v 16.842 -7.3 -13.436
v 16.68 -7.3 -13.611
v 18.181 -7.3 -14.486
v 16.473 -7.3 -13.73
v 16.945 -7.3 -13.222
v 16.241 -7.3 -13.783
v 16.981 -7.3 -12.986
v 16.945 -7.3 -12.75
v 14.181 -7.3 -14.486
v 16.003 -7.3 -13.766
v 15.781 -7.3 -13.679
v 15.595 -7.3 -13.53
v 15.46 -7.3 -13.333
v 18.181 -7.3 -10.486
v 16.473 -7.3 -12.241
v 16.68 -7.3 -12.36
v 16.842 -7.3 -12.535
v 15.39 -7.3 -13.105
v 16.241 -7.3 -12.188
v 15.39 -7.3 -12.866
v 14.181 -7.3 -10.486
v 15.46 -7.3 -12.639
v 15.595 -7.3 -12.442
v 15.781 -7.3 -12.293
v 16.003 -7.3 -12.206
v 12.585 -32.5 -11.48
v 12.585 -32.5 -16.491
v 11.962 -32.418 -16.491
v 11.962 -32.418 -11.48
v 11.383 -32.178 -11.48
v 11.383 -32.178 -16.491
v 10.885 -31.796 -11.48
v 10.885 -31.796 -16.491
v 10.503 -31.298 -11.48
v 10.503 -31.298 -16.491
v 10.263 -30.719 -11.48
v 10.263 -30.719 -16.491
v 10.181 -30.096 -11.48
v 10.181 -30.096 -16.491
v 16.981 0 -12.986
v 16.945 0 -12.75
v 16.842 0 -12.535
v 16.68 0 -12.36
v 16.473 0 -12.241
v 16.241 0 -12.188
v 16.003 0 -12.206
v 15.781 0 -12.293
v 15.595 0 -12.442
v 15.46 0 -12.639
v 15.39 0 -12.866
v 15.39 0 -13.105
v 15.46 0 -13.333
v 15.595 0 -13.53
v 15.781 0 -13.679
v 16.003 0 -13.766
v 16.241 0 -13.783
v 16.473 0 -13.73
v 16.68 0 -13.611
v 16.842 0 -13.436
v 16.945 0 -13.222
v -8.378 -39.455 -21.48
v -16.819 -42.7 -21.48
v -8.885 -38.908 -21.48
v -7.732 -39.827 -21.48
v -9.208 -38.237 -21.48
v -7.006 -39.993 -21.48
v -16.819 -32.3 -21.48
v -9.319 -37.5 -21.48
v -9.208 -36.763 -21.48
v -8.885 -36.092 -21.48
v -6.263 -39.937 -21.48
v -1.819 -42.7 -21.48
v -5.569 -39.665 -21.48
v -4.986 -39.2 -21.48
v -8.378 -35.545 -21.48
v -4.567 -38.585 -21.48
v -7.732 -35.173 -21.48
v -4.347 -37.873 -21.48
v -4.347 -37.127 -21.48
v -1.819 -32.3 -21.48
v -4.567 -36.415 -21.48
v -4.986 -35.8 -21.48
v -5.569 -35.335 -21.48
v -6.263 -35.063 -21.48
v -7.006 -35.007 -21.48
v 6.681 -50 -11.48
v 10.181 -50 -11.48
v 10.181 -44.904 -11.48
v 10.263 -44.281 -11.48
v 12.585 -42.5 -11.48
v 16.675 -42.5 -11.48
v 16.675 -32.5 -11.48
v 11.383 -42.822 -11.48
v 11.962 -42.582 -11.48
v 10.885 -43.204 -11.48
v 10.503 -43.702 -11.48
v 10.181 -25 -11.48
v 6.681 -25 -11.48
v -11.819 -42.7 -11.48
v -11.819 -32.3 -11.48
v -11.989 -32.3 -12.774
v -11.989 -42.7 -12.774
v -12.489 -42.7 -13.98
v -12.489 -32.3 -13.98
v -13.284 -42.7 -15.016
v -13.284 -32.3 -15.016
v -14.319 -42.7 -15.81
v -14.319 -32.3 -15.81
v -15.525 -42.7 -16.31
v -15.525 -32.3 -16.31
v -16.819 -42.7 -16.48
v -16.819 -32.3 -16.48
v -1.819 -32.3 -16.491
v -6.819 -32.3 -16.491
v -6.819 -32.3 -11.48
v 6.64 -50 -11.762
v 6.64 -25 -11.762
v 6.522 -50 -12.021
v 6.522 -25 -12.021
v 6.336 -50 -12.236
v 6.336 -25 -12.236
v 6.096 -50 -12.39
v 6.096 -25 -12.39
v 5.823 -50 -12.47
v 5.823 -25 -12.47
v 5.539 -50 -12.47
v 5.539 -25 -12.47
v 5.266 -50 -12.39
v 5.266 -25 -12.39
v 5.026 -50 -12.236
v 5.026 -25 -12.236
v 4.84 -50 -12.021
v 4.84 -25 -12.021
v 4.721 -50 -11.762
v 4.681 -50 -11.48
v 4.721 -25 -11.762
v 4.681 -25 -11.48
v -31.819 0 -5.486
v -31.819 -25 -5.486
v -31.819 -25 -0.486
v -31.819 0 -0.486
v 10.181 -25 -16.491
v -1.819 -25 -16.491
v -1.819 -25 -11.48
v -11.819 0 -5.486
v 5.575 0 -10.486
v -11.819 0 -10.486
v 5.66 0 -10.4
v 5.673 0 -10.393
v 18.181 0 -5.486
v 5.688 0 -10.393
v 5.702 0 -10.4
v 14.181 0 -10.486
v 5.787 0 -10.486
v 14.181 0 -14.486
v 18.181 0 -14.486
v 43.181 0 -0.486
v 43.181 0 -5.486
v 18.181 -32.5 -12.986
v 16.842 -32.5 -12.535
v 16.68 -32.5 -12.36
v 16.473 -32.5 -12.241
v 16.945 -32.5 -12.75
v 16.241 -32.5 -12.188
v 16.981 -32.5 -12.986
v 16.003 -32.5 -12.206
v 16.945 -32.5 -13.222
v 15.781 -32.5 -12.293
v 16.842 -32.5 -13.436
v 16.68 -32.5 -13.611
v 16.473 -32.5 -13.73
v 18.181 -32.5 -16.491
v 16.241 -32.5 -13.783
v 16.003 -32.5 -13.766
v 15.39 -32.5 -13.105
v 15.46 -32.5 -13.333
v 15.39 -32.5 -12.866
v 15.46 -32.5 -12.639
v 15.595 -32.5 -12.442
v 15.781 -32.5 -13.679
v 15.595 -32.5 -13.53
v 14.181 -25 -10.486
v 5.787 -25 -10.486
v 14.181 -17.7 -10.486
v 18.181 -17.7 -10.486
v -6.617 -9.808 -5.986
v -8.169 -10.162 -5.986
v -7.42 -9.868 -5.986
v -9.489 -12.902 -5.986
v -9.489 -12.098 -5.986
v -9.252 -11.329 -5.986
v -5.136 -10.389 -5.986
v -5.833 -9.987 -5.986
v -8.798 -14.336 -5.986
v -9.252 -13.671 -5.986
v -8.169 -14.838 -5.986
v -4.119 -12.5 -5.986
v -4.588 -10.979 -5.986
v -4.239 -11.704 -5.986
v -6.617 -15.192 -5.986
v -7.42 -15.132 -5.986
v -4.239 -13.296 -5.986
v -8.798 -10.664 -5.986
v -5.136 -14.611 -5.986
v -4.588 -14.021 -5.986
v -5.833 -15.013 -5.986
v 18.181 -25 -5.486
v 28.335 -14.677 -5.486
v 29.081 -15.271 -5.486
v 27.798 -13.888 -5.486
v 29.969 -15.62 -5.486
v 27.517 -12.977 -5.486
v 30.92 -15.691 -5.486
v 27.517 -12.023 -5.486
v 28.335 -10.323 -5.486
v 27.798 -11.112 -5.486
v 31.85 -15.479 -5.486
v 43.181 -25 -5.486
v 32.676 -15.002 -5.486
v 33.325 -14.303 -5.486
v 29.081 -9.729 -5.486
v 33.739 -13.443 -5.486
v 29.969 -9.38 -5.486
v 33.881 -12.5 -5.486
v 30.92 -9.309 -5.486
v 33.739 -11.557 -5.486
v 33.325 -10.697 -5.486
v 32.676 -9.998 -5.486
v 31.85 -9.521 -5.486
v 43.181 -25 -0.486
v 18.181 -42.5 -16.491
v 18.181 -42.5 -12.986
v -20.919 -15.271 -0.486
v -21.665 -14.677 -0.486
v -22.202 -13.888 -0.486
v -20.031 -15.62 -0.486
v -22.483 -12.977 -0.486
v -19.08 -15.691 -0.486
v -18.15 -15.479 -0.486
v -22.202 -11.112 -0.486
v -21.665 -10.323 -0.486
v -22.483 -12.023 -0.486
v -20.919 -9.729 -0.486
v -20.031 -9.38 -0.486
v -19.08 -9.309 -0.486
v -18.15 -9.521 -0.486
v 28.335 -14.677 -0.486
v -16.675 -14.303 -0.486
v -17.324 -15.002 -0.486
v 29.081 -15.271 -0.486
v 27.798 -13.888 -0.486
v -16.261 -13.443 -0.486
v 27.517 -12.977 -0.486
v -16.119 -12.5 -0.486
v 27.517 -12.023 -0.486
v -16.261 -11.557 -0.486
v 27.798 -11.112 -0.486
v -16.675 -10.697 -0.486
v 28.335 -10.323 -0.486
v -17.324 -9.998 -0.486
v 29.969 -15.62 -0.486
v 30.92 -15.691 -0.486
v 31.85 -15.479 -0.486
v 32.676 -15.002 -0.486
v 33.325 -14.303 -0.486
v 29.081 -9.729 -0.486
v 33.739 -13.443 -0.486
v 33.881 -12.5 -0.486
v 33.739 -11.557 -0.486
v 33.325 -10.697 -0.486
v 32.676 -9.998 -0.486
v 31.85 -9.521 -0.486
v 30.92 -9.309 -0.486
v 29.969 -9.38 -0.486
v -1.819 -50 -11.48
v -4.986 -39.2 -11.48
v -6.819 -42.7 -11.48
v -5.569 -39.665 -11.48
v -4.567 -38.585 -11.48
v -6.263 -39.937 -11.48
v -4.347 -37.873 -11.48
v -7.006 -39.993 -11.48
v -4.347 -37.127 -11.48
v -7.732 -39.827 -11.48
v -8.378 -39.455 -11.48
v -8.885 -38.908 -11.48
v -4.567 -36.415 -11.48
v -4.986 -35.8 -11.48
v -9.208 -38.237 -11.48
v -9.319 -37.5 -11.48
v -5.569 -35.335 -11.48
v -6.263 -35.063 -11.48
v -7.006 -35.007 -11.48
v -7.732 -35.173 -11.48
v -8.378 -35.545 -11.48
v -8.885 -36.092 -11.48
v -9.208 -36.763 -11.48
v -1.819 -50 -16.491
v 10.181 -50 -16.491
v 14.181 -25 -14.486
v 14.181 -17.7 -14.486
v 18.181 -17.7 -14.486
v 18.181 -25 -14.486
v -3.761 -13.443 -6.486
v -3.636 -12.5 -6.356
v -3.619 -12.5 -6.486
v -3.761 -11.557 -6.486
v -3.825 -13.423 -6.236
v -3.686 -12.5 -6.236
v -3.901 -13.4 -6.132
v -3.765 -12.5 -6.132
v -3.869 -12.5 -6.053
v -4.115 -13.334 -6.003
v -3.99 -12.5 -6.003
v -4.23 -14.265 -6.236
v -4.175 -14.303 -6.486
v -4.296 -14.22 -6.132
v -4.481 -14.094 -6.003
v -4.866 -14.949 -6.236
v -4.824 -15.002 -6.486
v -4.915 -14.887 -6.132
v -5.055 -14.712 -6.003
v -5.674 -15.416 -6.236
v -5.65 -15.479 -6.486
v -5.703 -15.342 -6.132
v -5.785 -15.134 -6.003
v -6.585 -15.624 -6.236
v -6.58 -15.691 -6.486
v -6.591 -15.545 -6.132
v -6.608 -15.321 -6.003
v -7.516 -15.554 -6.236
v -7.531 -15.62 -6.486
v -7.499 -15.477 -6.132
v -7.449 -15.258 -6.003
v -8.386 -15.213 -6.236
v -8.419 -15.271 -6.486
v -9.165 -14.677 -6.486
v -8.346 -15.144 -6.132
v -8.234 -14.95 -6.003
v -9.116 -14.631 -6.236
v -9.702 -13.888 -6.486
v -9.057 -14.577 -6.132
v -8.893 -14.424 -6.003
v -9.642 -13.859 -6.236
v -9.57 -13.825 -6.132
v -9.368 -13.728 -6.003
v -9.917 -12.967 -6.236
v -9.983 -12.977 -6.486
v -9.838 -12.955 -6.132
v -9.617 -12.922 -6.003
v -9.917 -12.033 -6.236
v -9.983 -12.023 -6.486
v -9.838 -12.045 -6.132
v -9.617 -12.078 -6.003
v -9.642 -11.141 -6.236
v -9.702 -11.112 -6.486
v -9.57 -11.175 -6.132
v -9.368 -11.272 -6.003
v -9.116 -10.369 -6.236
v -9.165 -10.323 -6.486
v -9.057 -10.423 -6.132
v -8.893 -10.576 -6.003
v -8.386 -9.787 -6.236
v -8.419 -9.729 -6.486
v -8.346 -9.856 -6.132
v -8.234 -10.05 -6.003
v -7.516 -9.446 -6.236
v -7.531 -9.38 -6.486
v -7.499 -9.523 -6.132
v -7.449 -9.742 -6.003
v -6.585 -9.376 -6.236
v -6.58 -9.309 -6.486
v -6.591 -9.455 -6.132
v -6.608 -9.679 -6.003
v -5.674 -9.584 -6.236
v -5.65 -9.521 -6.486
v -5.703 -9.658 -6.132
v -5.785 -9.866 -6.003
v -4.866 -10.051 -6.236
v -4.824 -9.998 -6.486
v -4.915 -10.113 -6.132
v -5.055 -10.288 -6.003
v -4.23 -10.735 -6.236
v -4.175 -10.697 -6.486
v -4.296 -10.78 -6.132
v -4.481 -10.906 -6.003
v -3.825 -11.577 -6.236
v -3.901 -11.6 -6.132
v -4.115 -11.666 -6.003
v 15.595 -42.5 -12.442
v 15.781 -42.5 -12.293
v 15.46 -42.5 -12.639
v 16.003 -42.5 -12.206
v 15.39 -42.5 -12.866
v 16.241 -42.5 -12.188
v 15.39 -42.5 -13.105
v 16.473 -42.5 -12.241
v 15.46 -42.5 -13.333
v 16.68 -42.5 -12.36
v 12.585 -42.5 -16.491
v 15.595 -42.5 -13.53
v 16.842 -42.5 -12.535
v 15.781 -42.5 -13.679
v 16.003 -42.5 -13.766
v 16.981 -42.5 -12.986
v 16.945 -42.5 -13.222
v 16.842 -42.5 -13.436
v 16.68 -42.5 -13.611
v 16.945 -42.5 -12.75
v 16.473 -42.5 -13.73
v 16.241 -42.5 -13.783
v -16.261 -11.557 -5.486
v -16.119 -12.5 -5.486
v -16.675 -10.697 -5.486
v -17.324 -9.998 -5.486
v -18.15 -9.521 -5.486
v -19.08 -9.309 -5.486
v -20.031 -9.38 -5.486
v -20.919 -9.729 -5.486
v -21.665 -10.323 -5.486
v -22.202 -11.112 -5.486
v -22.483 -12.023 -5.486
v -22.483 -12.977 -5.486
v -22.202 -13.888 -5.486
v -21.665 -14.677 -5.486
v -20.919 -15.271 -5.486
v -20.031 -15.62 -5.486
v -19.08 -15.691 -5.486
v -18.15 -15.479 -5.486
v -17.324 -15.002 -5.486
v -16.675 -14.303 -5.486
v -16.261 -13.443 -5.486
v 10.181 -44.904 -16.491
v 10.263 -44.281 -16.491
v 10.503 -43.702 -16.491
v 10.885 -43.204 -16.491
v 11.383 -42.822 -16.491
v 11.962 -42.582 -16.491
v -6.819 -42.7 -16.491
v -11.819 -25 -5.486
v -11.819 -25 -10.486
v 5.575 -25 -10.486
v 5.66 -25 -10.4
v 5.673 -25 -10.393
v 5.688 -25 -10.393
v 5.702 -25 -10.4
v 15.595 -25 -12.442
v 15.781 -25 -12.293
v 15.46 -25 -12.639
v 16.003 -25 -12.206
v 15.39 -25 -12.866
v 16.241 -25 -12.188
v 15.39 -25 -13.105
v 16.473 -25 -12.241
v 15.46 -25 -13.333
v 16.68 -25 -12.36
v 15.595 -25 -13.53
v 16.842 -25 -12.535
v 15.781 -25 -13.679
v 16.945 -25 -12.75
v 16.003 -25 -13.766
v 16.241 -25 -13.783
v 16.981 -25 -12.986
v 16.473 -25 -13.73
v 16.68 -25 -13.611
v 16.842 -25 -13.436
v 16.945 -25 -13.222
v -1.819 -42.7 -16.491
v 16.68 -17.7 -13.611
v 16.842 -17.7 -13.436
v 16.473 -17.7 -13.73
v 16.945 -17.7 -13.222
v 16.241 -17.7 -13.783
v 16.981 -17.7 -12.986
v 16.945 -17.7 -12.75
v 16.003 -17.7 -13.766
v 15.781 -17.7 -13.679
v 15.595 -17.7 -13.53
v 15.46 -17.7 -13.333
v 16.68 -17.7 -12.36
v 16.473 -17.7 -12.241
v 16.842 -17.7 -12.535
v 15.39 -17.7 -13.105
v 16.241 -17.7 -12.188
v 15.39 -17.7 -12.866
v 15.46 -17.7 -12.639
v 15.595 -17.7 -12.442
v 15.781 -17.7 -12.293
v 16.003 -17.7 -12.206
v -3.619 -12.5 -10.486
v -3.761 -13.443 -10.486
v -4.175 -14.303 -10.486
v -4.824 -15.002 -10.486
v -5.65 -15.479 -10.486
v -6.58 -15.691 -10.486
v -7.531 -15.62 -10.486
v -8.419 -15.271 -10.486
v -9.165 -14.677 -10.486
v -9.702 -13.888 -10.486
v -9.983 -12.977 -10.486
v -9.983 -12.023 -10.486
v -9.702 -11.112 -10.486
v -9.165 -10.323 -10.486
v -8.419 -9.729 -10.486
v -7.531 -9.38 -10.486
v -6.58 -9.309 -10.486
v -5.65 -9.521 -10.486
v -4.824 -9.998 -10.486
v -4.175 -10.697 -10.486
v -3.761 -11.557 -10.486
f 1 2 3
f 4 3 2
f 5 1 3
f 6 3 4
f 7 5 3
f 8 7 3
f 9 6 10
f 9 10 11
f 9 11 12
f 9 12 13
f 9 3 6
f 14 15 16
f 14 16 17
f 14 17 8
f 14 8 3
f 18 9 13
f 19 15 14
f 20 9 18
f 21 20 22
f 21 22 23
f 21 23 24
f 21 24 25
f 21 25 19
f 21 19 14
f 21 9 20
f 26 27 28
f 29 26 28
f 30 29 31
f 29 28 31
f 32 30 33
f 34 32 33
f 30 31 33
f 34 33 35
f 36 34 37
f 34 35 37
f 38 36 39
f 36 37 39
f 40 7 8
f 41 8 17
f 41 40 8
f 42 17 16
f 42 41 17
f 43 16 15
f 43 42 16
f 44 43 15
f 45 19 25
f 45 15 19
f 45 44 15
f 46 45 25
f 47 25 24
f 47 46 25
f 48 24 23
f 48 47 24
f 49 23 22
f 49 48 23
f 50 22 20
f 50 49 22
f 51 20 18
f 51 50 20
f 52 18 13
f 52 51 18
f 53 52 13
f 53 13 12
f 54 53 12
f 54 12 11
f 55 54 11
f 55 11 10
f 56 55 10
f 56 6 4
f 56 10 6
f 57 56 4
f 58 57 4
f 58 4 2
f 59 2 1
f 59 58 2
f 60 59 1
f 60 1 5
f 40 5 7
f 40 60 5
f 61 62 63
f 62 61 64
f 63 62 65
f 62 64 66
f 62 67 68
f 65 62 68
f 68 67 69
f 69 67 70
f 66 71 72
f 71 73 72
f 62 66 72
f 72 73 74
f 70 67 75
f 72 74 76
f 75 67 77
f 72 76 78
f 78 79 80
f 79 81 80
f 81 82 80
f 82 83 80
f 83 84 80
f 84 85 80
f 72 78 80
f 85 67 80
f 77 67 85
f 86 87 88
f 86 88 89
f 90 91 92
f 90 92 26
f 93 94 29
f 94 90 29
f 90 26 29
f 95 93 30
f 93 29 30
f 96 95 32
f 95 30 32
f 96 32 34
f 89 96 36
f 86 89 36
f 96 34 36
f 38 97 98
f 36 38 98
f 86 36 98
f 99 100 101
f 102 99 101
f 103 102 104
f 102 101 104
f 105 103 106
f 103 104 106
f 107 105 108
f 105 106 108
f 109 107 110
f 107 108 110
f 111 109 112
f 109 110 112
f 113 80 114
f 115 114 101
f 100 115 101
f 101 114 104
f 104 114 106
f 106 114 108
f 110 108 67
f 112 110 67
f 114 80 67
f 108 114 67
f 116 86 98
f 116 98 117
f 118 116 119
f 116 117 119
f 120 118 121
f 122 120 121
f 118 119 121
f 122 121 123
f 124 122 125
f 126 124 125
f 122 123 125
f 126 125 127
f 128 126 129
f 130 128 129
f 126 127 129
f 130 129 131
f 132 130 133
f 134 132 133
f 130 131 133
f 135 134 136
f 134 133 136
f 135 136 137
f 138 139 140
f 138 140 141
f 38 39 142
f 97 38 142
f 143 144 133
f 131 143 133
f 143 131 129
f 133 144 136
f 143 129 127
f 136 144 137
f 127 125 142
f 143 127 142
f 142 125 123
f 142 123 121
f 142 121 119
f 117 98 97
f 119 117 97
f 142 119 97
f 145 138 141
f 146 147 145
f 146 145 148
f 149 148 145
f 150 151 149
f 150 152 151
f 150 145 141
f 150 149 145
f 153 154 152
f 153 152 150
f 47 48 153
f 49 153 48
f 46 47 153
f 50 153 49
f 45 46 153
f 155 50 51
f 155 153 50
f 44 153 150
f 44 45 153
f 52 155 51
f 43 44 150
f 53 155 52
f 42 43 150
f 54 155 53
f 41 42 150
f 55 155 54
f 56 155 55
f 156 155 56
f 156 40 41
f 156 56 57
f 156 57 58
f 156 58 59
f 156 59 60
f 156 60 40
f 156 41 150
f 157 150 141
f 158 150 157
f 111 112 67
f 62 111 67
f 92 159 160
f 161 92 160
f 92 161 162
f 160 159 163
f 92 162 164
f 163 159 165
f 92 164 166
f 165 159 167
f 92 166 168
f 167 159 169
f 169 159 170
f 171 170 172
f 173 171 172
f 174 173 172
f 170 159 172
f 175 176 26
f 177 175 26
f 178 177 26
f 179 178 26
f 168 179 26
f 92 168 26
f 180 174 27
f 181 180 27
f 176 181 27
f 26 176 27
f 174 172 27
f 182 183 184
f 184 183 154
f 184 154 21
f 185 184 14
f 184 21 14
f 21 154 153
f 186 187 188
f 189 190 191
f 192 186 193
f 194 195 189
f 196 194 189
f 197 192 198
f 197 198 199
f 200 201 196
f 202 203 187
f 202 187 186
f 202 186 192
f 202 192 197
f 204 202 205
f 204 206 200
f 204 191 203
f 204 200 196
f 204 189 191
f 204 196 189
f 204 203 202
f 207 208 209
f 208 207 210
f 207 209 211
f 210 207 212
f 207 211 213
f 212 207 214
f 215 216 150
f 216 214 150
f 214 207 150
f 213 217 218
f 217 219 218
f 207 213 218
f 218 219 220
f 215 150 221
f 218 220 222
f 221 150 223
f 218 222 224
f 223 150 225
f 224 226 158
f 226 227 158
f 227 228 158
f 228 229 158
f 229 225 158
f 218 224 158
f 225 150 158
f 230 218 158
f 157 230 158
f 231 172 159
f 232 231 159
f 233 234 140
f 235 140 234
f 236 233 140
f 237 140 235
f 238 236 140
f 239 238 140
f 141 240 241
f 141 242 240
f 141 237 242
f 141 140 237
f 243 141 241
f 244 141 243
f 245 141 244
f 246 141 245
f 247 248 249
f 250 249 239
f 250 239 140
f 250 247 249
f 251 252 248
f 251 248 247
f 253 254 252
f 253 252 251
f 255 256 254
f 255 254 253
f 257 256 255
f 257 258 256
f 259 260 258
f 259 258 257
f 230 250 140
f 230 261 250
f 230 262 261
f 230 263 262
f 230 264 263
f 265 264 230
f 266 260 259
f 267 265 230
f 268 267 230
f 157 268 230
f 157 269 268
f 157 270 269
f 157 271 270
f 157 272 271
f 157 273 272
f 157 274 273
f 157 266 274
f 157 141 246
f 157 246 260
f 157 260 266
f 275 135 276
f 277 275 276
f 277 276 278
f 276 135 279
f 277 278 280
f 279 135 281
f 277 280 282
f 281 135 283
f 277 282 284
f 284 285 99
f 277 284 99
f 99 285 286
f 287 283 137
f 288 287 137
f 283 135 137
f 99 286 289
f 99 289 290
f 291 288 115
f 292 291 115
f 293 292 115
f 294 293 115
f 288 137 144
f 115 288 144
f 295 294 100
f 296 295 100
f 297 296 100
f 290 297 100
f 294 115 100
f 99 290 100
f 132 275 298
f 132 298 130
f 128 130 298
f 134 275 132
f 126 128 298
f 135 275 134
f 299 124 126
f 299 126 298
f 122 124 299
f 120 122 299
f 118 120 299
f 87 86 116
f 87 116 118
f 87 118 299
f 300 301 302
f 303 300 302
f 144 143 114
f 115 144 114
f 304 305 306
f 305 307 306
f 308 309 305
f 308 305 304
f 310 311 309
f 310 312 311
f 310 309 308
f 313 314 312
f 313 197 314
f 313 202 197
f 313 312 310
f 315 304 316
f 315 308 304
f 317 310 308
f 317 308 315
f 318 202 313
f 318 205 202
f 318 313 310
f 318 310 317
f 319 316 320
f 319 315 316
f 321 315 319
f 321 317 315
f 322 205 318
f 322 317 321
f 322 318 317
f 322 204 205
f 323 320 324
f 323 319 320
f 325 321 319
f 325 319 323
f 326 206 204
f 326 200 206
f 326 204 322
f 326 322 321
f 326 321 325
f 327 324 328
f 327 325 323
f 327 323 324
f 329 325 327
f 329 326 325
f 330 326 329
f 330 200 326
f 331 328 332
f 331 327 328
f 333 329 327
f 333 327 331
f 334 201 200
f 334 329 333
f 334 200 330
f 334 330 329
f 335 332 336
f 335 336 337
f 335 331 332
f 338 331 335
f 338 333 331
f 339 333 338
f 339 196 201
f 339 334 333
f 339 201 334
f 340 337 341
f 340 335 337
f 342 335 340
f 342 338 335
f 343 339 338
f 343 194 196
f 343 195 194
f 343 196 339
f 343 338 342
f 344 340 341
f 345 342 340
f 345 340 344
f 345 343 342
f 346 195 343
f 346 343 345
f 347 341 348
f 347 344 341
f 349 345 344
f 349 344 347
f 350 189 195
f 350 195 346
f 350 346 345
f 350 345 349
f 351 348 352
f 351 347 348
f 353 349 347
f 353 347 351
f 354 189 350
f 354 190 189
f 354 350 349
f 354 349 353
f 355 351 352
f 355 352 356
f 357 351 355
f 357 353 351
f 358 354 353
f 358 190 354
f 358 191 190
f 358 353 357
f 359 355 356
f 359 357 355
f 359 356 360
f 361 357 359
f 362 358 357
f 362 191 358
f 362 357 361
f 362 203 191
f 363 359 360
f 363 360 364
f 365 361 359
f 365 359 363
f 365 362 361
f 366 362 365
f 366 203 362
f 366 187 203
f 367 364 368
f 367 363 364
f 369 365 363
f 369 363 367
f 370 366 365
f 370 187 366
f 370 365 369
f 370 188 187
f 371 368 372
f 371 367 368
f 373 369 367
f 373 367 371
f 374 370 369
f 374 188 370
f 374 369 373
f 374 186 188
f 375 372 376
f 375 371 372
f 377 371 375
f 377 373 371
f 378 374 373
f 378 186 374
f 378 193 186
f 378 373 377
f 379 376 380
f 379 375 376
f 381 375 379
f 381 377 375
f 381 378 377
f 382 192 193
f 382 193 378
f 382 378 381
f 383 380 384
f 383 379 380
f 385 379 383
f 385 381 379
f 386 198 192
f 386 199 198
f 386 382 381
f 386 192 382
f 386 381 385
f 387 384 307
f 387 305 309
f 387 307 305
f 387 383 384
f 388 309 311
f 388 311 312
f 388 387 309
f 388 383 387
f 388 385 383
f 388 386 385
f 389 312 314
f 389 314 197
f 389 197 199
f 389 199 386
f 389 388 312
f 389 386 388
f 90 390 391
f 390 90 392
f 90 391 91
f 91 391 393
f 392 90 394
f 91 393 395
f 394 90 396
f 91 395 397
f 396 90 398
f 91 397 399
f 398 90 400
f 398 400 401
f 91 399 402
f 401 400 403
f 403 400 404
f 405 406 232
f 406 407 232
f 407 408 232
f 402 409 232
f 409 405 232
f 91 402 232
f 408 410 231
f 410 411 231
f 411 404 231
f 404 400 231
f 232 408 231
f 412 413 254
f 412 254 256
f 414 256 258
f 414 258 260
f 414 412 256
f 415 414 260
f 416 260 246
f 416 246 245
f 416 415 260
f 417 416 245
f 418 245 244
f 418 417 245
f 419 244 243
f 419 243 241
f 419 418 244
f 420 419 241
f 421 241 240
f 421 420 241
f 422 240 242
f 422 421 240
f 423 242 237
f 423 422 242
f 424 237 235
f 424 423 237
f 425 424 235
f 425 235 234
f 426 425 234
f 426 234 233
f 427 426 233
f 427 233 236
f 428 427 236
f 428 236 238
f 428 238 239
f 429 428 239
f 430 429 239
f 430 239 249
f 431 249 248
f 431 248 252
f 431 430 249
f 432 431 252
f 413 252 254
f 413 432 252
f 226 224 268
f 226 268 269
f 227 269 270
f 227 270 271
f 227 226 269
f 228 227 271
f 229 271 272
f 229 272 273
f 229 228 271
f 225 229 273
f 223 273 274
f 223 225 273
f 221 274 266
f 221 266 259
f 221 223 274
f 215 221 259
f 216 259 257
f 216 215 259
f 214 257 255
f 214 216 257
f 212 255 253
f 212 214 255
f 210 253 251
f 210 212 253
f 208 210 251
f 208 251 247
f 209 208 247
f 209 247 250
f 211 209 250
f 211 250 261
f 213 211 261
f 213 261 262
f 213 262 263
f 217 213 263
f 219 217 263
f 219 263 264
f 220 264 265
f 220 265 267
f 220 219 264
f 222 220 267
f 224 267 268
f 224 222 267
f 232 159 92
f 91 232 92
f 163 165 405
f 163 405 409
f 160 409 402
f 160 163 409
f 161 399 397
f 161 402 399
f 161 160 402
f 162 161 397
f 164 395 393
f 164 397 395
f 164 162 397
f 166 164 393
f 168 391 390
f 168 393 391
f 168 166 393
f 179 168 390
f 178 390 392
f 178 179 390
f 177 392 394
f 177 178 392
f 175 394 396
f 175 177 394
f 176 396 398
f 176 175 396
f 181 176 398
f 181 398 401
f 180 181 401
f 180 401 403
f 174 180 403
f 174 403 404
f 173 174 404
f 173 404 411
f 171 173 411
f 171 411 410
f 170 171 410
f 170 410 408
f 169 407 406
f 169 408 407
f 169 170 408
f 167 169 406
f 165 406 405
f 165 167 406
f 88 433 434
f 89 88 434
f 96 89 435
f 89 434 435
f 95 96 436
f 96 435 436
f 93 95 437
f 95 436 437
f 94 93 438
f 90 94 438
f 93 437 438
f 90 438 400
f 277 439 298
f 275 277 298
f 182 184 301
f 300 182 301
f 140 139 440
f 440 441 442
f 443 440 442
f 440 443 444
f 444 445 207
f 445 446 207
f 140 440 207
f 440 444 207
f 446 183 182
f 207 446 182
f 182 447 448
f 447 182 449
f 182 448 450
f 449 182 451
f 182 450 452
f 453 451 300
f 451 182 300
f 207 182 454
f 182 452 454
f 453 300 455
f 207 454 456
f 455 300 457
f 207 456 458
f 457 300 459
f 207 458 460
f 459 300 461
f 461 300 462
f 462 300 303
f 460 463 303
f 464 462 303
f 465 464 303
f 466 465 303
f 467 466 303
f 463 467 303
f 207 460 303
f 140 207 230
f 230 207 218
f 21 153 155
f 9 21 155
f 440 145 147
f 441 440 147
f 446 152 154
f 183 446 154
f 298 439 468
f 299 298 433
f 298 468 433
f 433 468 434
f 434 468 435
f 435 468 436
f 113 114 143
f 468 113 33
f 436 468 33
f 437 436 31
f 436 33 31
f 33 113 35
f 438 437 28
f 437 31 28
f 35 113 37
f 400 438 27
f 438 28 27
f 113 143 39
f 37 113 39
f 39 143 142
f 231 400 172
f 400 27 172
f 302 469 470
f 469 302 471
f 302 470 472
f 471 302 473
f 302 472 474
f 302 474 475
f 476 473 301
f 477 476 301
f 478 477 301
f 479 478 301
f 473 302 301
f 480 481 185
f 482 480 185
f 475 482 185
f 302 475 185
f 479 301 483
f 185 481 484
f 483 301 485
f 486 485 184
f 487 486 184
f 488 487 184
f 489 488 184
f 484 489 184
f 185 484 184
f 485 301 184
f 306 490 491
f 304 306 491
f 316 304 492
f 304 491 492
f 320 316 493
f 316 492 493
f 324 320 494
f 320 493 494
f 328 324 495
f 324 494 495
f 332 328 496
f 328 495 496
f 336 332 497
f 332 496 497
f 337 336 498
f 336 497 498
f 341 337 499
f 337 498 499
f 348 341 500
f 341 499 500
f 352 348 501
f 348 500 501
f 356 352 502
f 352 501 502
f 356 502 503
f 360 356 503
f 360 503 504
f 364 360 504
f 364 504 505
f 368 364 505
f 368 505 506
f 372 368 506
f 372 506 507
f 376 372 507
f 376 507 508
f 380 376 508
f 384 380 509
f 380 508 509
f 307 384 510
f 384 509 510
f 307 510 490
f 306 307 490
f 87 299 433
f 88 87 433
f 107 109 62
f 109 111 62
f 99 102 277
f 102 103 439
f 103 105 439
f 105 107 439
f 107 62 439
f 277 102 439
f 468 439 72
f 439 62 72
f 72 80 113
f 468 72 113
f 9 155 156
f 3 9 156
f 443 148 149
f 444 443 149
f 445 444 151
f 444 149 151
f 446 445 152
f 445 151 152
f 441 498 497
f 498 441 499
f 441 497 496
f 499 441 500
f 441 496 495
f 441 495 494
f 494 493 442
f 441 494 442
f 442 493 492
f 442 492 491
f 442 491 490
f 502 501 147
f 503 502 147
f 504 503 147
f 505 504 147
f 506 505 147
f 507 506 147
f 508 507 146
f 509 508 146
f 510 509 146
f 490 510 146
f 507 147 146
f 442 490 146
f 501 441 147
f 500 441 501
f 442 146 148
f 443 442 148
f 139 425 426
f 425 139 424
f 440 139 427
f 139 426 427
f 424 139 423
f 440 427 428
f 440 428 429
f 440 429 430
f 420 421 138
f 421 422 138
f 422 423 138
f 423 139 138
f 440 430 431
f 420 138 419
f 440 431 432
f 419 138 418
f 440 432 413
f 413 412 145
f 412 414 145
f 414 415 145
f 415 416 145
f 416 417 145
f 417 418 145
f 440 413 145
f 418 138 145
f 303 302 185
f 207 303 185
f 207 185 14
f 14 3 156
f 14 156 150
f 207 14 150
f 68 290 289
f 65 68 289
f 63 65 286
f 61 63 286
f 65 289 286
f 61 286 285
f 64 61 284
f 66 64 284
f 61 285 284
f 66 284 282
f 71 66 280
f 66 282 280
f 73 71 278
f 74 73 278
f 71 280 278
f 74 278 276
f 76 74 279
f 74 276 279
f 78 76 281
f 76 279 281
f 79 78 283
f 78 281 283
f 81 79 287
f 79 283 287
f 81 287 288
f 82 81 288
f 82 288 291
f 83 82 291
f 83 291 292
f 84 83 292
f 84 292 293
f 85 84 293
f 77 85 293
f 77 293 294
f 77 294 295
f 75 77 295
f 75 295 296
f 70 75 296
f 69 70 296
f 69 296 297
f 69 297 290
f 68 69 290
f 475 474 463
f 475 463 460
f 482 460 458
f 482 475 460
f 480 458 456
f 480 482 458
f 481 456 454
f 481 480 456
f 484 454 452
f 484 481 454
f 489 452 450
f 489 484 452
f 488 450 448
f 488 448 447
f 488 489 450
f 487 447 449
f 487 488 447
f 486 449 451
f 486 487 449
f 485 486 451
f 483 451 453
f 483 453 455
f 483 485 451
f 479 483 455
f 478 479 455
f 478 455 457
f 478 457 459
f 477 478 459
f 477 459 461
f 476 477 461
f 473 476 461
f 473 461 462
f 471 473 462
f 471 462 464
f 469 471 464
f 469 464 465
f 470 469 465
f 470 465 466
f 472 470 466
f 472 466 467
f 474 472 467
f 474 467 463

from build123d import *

# Parameters (mm, degrees)
F0_R      = 0.8
F1_DEPTH  = 25
F2_R      = 3.2
F3_DEPTH  = 4.5
F4_W      = 75
F4_H      = 25
F4_R      = 3.2
F5_DEPTH  = 5
F6_W      = 10.4
F6_H      = 4
F7_DEPTH  = 25
F8_R      = 0.8
F9_DEPTH  = 25
F11_DEPTH = 5.0111704883
F13_D     = 5
F14_W     = 7.3
F14_H     = 4.9888295117
F15_DEPTH = 25
F17_DEPTH = 5.0111704883
F18_R     = 0.5


with BuildPart() as f1:
    # F0 (on Front) → F1 (new body)
    with BuildSketch(Plane.XZ):
        with BuildLine():
            Line((5.7870310192, -10.4857282235), (14.1809650045, -10.4857282235))
            Line((14.1809650045, -10.4857282235), (14.1809650045, -14.4857282235))
            Line((14.1809650045, -14.4857282235), (18.1809650045, -14.4857282235))
            Line((18.1809650045, -14.4857282235), (18.1809650045, -5.4857282235))
            Line((18.1809650045, -5.4857282235), (-11.8190349955, -5.4857282235))
            Line((-11.8190349955, -5.4857282235), (-11.8190349955, -10.4857282235))
            Line((-11.8190349955, -10.4857282235), (5.5748989899, -10.4857282235))
            Line((5.5748989899, -10.4857282235), (5.6604079271, -10.4002192823))
            ThreePointArc((5.6604079271, -10.4002192823), (5.6809650045, -10.3917042618), (5.701522082, -10.4002192823))
            Line((5.701522082, -10.4002192823), (5.7870310192, -10.4857282235))
        make_face()
        with Locations((16.1809650045, -12.9857282235)):
            Circle(F0_R, mode=Mode.SUBTRACT)
    extrude(amount=F1_DEPTH)

    # F2 (on face) → F3 (cut)
    with BuildSketch(Plane(origin=(0, 0, -10.4857282235), x_dir=(1, 0, 0), z_dir=(0, 0, -1))):
        with Locations((-6.8190349955, 12.5)):
            Circle(F2_R)
    extrude(amount=-F3_DEPTH, mode=Mode.SUBTRACT)

    # F4 (on face) → F5 (join)
    with BuildSketch(Plane.XY.offset(-5.4857282235)):
        with Locations((5.6809650045, -12.5)):
            Rectangle(F4_W, F4_H)
        with Locations((-19.3190349955, -12.5)):
            Circle(F4_R, mode=Mode.SUBTRACT)
        with Locations((30.6809650045, -12.5)):
            Circle(F4_R, mode=Mode.SUBTRACT)
    extrude(amount=F5_DEPTH)

    # F6 (on face) → F7 (cut)
    with BuildSketch(Plane(origin=(14.1809650045, 0, 0), x_dir=(0, -1, 0), z_dir=(-1, 0, 0))):
        with Locations((12.5, -12.4857282235)):
            Rectangle(F6_W, F6_H)
    extrude(amount=-F7_DEPTH, mode=Mode.SUBTRACT)

    # F18
    f18_edges = [f1.edges().sort_by_distance(p)[0] for p in [
        (-10.019035, -12.5, -5.985728),
    ]]
    fillet(f18_edges, radius=F18_R)


with BuildPart() as f9:
    # F8 (on face) → F9 (new body)
    with BuildSketch(Plane.XZ.offset(25)):
        with BuildLine():
            ThreePointArc((6.6809650045, -11.4800873139), (5.6809650045, -12.4800873139), (4.6809650045, -11.4800873139))
            Line((4.6809650045, -11.4800873139), (-11.8190349955, -11.4800873139))
            ThreePointArc((-11.8190349955, -11.4800873139), (-13.2835010895, -15.0156212198), (-16.8190349955, -16.4800873139))
            Line((-16.8190349955, -16.4800873139), (-16.8190349955, -21.4800873139))
            Line((-16.8190349955, -21.4800873139), (-1.8190349955, -21.4800873139))
            Line((-1.8190349955, -21.4800873139), (-1.8190349955, -16.4912578022))
            Line((-1.8190349955, -16.4912578022), (18.1809650045, -16.4912578022))
            Line((18.1809650045, -16.4912578022), (18.1809650045, -12.9857282235))
            Line((18.1809650045, -12.9857282235), (16.6753240949, -11.4800873139))
            Line((16.6753240949, -11.4800873139), (6.6809650045, -11.4800873139))
        make_face()
        with Locations((16.1809650045, -12.9857282235)):
            Circle(F8_R, mode=Mode.SUBTRACT)
    extrude(amount=F9_DEPTH)

    # F10 (on face) → F11 (cut, through all)
    with BuildSketch(Plane(origin=(0, 0, -16.4912578022), x_dir=(1, 0, 0), z_dir=(0, 0, -1))):
        with BuildLine():
            Line((12.5845505148, 42.5), (18.1809650045, 42.5))
            Line((18.1809650045, 42.5), (18.1809650045, 50))
            Line((18.1809650045, 50), (10.1809650045, 50))
            Line((10.1809650045, 50), (10.1809650045, 44.9035855103))
            ThreePointArc((10.1809650045, 44.9035855103), (10.8849589013, 43.2039938968), (12.5845505148, 42.5))
        make_face()
        with BuildLine():
            Line((18.1809650045, 25), (18.1809650045, 32.5))
            Line((18.1809650045, 32.5), (12.5845505148, 32.5))
            ThreePointArc((12.5845505148, 32.5), (10.8849589013, 31.7960061032), (10.1809650045, 30.0964144897))
            Line((10.1809650045, 30.0964144897), (10.1809650045, 25))
            Line((10.1809650045, 25), (18.1809650045, 25))
        make_face()
    extrude(amount=-F11_DEPTH, mode=Mode.SUBTRACT)

    # F13 (through all)
    with Locations(Plane(origin=(0, 0, -21.4800873139), x_dir=(1, 0, 0), z_dir=(0, 0, -1))):
        with Locations((-6.8190349955, 37.5)):
            Hole(F13_D / 2)

    # F14 (on face) → F15 (cut)
    with BuildSketch(Plane.YZ.offset(-1.8190349955)):
        with Locations((-28.65, -18.985672558)):
            Rectangle(F14_W, F14_H)
        with Locations((-46.35, -18.985672558)):
            Rectangle(F14_W, F14_H)
    extrude(amount=-F15_DEPTH, mode=Mode.SUBTRACT)

    # F16 (on face) → F17 (cut, through all)
    with BuildSketch(Plane(origin=(0, 0, -16.4912578022), x_dir=(1, 0, 0), z_dir=(0, 0, -1))):
        Polygon((-16.8190349955, 50), (-16.8190349955, 42.7), (-6.8190349955, 42.7), (-1.8190349955, 50), align=None)
        Polygon((-6.8190349955, 32.3), (-16.8190349955, 32.3), (-16.8190349955, 25), (-1.8190349955, 25), align=None)
    extrude(amount=-F17_DEPTH, mode=Mode.SUBTRACT)


solid = Compound([f1.part, f9.part])
